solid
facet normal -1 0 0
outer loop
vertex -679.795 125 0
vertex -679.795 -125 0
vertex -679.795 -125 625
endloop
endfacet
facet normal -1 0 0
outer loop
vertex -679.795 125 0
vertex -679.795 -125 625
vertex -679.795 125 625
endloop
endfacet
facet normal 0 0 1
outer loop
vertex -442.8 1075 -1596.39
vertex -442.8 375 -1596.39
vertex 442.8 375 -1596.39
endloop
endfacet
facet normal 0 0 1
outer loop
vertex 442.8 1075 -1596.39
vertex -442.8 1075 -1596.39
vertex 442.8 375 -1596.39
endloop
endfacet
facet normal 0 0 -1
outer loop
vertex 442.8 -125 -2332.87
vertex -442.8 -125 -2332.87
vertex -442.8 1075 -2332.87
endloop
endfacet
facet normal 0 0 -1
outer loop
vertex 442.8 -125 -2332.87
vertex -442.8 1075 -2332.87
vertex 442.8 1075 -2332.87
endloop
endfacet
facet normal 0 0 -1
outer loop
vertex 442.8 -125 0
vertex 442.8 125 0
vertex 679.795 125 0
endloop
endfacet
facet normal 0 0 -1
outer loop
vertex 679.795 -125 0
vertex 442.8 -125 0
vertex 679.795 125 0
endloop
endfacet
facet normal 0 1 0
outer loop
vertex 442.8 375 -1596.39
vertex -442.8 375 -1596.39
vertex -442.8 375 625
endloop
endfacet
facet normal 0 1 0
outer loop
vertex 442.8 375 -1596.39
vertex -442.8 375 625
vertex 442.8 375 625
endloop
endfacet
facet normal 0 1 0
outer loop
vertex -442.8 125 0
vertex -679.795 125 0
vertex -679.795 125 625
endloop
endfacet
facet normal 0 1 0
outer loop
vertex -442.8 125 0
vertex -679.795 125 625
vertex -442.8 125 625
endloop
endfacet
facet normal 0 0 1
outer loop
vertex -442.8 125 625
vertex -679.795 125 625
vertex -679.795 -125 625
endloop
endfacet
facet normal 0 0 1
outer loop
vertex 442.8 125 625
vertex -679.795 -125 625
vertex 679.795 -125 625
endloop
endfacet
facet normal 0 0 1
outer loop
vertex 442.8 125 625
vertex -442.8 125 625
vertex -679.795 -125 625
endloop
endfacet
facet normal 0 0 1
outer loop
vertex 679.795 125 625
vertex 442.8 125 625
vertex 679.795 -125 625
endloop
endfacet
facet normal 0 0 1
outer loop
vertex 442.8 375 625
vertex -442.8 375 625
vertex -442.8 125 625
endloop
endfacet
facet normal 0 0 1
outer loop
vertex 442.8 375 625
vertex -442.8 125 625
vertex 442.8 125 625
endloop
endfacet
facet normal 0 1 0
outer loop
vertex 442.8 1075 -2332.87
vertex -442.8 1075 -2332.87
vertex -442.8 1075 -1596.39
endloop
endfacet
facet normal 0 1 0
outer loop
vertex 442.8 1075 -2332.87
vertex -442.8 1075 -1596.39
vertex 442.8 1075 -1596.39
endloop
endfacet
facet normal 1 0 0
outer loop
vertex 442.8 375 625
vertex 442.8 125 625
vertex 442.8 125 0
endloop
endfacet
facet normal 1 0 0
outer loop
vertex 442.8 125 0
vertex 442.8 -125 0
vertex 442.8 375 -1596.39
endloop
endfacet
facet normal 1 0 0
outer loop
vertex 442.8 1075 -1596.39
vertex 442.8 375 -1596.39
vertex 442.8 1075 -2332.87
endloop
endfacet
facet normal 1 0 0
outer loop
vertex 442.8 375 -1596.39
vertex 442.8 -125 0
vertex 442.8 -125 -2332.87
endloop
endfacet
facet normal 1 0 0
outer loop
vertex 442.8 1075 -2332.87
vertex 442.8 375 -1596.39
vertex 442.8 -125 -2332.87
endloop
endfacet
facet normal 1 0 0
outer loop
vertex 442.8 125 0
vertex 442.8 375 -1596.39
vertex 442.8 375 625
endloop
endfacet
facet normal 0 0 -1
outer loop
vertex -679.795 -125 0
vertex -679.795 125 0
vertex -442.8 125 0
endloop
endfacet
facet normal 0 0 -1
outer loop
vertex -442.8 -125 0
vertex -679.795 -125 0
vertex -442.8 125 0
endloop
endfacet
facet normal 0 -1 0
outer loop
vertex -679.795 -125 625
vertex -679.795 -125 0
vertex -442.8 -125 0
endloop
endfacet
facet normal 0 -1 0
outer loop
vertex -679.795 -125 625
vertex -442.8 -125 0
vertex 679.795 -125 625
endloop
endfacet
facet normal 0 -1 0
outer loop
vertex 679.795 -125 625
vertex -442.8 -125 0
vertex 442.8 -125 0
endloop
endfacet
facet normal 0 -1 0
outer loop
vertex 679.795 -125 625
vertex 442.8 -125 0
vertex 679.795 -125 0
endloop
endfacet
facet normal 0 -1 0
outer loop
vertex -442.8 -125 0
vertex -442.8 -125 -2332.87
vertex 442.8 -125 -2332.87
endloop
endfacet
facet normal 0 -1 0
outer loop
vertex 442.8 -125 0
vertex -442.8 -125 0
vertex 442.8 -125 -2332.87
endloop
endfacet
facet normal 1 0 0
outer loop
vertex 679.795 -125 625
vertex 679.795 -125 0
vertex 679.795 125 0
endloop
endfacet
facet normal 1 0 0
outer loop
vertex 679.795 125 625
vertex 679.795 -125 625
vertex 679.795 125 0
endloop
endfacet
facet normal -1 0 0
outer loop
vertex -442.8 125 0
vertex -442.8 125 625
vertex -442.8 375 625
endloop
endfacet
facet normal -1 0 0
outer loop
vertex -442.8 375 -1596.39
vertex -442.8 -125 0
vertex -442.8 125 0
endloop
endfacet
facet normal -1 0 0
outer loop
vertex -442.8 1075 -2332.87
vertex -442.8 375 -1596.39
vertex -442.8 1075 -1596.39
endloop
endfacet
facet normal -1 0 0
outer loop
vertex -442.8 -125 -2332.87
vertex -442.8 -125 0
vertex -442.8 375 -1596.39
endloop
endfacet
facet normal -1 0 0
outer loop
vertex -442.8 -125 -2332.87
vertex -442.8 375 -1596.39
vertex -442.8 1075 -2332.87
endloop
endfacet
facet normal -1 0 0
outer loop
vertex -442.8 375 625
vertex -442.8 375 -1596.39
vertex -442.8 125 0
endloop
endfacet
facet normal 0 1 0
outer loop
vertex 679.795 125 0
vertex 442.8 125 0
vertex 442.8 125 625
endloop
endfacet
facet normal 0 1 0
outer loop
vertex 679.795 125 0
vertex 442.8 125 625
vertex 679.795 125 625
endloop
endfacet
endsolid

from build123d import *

# Parameters (mm, degrees)
SKETCH1_W           = 1359.59
SKETCH1_H           = 250
BOSS_EXTRUDE1_DEPTH = 625
SKETCH2_W           = 885.6
SKETCH2_H           = 500
BOSS_EXTRUDE2_DEPTH = 2957.87
SKETCH3_W           = 885.6
SKETCH3_H           = 736.48
BOSS_EXTRUDE4_DEPTH = 700


with BuildPart() as part:
    # Sketch1 → Boss-Extrude1 (new body)
    with BuildSketch(Plane.XY):
        Rectangle(SKETCH1_W, SKETCH1_H)
    extrude(amount=BOSS_EXTRUDE1_DEPTH)

    # Sketch2 → Boss-Extrude2 (add)
    with BuildSketch(Plane.XY.offset(625)):
        with Locations((0, 125)):
            Rectangle(SKETCH2_W, SKETCH2_H)
    extrude(amount=-BOSS_EXTRUDE2_DEPTH)

    # Sketch3 → Boss-Extrude4 (add)
    with BuildSketch(Plane(origin=(0, 375, 0), x_dir=(1, 0, 0), z_dir=(0, 1, 0))):
        with Locations((0, 1964.63)):
            Rectangle(SKETCH3_W, SKETCH3_H)
    extrude(amount=BOSS_EXTRUDE4_DEPTH)


solid = part.part
